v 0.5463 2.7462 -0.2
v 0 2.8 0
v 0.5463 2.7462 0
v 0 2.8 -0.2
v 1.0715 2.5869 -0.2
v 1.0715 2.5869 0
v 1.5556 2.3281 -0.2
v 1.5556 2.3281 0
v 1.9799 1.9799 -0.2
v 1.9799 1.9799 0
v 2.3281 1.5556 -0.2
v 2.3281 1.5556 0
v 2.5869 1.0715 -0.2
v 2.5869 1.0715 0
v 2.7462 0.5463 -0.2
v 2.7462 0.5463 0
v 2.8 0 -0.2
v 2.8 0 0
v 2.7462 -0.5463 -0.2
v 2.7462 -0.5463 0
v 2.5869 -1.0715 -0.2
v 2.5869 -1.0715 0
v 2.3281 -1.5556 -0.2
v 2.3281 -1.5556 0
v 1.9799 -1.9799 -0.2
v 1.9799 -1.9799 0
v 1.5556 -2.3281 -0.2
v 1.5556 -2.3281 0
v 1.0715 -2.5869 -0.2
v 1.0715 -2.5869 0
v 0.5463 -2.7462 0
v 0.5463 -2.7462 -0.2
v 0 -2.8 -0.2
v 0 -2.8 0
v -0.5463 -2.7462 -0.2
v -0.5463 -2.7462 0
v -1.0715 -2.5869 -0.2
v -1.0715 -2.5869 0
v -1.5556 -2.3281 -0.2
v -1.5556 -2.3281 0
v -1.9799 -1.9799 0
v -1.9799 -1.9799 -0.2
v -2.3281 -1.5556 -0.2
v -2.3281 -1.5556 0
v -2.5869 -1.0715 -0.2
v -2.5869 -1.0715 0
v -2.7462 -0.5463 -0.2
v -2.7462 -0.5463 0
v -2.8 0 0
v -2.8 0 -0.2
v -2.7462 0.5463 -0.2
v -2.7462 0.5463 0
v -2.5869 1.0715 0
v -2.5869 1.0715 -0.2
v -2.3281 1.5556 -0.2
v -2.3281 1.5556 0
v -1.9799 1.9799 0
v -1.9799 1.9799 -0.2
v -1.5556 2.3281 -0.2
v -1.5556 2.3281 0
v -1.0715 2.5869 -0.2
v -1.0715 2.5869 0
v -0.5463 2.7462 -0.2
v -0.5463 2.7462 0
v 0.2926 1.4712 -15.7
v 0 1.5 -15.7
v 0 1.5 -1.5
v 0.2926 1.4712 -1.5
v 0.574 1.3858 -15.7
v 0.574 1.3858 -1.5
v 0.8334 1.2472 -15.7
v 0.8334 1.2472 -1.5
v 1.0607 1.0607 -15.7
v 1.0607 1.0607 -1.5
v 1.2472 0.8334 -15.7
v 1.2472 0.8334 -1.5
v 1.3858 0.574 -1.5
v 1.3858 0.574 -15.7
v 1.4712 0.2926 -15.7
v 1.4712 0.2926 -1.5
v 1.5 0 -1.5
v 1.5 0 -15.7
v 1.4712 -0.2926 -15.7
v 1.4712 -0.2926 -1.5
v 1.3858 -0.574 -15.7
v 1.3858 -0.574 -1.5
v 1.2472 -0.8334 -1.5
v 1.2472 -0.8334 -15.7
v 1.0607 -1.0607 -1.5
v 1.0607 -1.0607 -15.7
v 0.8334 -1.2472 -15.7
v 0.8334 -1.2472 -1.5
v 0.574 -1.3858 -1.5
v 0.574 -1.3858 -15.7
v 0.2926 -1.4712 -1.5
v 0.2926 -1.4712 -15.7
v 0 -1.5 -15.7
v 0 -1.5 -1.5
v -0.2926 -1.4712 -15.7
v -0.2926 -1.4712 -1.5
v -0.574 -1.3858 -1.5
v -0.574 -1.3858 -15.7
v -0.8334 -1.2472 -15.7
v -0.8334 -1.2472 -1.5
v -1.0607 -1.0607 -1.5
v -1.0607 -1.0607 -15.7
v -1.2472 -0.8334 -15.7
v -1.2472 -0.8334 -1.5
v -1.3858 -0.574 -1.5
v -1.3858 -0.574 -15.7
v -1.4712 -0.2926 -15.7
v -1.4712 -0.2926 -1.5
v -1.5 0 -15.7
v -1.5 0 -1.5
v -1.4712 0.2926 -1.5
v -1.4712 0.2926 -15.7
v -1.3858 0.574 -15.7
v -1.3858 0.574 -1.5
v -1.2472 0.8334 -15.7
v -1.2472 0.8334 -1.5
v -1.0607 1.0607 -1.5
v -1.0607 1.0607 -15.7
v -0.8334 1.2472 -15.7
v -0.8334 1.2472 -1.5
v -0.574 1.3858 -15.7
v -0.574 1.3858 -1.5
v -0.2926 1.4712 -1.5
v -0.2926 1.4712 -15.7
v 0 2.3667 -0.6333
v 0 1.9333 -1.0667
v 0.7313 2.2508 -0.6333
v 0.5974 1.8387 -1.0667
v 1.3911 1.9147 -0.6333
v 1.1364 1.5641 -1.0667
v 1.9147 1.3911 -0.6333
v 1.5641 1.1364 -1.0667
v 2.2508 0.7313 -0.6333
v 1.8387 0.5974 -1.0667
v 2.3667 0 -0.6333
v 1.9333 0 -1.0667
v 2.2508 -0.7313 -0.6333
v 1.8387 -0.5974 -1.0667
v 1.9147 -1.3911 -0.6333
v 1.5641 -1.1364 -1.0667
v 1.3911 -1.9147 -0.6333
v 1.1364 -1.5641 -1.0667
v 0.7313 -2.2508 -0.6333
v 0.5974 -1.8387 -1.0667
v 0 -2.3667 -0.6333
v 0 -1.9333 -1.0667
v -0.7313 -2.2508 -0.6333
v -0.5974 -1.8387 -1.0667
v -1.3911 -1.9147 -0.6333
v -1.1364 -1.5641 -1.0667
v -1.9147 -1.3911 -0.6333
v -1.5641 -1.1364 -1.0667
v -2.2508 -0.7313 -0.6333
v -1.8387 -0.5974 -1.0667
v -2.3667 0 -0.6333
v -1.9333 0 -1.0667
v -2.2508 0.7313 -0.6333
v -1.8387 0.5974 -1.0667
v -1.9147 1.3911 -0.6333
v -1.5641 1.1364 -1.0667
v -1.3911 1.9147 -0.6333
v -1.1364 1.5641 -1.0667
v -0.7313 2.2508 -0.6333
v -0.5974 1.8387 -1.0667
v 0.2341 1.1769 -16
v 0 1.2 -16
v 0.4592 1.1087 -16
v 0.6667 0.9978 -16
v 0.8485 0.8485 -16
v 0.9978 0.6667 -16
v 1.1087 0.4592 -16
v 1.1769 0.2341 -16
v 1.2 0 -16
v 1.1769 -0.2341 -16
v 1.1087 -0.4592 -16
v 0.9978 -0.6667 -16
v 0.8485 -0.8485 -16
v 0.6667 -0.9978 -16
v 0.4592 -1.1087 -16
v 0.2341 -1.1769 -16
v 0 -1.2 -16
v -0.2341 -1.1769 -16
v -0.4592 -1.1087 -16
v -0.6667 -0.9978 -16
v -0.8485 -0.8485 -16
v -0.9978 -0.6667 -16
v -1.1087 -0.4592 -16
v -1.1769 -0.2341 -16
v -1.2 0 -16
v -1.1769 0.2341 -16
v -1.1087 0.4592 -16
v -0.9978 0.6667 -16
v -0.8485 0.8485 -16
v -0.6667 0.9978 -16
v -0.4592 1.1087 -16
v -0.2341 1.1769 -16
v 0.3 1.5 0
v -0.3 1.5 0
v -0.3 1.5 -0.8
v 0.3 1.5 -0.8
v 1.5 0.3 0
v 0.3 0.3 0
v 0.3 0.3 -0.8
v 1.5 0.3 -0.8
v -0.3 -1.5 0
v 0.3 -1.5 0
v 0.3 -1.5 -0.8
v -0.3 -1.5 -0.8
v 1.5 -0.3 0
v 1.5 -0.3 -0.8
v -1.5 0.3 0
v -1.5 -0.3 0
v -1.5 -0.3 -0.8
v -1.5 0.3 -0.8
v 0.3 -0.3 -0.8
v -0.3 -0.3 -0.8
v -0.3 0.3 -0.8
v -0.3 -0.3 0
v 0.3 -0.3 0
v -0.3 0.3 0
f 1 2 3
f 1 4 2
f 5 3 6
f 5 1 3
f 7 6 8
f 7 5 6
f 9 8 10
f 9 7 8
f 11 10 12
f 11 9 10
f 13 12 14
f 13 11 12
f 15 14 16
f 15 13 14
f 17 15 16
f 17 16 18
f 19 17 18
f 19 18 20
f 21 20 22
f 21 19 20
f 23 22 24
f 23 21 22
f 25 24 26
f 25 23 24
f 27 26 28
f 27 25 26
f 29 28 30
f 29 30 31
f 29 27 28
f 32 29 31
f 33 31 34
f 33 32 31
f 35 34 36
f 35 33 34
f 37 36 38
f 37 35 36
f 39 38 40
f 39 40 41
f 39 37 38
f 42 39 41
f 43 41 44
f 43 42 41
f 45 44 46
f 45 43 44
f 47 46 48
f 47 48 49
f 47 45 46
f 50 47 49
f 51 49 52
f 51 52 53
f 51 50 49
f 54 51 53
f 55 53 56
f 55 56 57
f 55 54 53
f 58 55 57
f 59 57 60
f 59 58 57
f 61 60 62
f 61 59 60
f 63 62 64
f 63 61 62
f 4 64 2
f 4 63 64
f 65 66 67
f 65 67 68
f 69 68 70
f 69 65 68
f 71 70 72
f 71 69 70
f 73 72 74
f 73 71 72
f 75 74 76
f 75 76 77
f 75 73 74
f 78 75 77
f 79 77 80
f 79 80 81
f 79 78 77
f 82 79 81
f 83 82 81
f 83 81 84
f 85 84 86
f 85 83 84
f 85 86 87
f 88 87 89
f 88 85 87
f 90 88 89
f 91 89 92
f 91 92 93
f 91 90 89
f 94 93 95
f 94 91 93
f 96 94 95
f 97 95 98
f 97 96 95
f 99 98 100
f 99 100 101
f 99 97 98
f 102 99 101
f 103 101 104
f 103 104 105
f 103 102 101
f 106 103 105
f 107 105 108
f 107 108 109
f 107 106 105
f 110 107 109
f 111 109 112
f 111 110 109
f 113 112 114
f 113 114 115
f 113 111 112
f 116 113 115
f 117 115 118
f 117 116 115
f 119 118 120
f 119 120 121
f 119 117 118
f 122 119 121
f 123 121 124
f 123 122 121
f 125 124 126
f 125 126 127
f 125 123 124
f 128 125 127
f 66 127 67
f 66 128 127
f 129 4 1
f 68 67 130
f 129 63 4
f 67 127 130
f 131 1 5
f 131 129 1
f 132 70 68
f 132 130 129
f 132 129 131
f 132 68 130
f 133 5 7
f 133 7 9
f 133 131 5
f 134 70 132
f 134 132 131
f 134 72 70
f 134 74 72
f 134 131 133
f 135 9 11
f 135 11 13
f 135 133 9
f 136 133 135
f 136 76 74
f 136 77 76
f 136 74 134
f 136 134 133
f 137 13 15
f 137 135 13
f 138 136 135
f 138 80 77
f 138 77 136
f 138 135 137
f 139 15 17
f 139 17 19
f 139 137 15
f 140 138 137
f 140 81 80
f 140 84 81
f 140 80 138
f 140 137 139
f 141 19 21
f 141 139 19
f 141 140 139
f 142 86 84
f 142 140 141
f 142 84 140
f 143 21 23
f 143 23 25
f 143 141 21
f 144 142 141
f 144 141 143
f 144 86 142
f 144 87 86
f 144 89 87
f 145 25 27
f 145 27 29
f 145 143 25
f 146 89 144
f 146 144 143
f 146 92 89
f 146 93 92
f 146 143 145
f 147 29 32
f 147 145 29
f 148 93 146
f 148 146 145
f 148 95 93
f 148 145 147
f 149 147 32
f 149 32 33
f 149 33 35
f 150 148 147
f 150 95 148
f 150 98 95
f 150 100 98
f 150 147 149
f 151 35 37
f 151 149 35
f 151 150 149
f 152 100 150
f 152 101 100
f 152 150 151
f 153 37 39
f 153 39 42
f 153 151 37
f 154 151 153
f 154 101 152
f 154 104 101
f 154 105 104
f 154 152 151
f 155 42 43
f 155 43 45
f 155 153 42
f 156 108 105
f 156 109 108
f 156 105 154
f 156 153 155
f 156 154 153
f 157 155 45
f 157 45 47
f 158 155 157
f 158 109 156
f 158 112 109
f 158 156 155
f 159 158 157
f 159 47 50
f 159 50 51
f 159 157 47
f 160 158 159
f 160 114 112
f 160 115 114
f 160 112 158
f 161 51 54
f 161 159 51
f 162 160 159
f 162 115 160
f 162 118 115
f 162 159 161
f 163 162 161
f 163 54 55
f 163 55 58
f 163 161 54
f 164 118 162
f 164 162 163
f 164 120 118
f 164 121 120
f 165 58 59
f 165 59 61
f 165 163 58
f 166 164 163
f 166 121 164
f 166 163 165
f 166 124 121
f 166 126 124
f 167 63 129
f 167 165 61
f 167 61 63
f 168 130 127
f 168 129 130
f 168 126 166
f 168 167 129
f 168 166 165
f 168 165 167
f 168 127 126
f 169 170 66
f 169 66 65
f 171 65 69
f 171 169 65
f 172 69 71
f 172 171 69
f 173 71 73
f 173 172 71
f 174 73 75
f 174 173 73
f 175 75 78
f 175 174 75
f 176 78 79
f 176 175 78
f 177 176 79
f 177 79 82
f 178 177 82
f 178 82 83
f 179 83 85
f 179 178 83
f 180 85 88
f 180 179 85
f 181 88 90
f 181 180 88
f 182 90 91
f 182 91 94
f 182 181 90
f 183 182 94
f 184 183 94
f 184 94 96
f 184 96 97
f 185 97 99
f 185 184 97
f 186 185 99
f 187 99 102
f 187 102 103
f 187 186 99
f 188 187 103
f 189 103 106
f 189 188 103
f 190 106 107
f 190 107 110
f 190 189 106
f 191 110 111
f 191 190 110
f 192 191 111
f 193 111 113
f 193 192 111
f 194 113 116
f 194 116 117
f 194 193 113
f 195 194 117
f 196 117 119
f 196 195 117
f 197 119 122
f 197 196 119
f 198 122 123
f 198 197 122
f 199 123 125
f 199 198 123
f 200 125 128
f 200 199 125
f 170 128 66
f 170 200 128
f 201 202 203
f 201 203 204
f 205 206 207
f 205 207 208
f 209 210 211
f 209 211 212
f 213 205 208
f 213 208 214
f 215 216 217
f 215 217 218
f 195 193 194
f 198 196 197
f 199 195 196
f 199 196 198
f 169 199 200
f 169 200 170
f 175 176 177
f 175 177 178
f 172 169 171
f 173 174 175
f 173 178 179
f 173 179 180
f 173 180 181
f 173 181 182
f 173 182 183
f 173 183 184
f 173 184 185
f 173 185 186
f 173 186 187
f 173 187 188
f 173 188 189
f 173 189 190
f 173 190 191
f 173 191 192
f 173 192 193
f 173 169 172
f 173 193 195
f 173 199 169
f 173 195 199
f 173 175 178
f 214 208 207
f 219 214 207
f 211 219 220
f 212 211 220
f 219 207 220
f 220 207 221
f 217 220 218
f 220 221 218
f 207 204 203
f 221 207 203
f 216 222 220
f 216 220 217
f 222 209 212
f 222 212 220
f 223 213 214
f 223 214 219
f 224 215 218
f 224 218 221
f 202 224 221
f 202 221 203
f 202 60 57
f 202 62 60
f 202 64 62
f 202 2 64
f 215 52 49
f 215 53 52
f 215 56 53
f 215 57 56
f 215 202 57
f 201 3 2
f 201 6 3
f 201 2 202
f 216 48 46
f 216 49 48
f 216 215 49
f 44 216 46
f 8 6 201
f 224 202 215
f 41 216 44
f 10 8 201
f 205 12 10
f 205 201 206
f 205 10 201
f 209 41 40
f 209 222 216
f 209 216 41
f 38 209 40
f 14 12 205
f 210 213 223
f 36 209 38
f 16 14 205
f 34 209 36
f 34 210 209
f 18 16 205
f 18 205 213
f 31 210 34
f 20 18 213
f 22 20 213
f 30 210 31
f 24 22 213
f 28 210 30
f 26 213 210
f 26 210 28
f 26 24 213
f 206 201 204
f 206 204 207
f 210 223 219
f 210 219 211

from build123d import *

# Parameters (mm, degrees)
SCHNITT_LINEAR_AUSTRAGEN1_DEPTH = 0.8
FASE1_SIZE                      = 0.3


with BuildPart() as part:
    # Skizze1 → Rotation1 (revolve)
    with BuildSketch(Plane(origin=(0, 0, 0), x_dir=(0, 0, -1), z_dir=(1, 0, 0))):
        Polygon((0, 0), (0, 2.8), (0.2, 2.8), (1.5, 1.5), (16, 1.5), (16, 0), align=None)
    revolve(axis=Axis((0, 0, 31.763581507), (0, 0, -1)))

    # Skizze3 → Schnitt-Linear austragen1 (cut)
    with BuildSketch(Plane.XY):
        Polygon((-1.5, -0.3), (-1.5, 0.3), (-0.3, 0.3), (-0.3, 1.5), (0.3, 1.5), (0.3, 0.3), (1.5, 0.3), (1.5, -0.3), (0.3, -0.3), (0.3, -1.5), (-0.3, -1.5), (-0.3, -0.3), align=None)
    extrude(amount=-SCHNITT_LINEAR_AUSTRAGEN1_DEPTH, mode=Mode.SUBTRACT)

    # Fase1
    fase1_edges = [part.edges().sort_by_distance(p)[0] for p in [
        (0, -1.5, -16),
    ]]
    chamfer(fase1_edges, length=FASE1_SIZE)


solid = part.part
